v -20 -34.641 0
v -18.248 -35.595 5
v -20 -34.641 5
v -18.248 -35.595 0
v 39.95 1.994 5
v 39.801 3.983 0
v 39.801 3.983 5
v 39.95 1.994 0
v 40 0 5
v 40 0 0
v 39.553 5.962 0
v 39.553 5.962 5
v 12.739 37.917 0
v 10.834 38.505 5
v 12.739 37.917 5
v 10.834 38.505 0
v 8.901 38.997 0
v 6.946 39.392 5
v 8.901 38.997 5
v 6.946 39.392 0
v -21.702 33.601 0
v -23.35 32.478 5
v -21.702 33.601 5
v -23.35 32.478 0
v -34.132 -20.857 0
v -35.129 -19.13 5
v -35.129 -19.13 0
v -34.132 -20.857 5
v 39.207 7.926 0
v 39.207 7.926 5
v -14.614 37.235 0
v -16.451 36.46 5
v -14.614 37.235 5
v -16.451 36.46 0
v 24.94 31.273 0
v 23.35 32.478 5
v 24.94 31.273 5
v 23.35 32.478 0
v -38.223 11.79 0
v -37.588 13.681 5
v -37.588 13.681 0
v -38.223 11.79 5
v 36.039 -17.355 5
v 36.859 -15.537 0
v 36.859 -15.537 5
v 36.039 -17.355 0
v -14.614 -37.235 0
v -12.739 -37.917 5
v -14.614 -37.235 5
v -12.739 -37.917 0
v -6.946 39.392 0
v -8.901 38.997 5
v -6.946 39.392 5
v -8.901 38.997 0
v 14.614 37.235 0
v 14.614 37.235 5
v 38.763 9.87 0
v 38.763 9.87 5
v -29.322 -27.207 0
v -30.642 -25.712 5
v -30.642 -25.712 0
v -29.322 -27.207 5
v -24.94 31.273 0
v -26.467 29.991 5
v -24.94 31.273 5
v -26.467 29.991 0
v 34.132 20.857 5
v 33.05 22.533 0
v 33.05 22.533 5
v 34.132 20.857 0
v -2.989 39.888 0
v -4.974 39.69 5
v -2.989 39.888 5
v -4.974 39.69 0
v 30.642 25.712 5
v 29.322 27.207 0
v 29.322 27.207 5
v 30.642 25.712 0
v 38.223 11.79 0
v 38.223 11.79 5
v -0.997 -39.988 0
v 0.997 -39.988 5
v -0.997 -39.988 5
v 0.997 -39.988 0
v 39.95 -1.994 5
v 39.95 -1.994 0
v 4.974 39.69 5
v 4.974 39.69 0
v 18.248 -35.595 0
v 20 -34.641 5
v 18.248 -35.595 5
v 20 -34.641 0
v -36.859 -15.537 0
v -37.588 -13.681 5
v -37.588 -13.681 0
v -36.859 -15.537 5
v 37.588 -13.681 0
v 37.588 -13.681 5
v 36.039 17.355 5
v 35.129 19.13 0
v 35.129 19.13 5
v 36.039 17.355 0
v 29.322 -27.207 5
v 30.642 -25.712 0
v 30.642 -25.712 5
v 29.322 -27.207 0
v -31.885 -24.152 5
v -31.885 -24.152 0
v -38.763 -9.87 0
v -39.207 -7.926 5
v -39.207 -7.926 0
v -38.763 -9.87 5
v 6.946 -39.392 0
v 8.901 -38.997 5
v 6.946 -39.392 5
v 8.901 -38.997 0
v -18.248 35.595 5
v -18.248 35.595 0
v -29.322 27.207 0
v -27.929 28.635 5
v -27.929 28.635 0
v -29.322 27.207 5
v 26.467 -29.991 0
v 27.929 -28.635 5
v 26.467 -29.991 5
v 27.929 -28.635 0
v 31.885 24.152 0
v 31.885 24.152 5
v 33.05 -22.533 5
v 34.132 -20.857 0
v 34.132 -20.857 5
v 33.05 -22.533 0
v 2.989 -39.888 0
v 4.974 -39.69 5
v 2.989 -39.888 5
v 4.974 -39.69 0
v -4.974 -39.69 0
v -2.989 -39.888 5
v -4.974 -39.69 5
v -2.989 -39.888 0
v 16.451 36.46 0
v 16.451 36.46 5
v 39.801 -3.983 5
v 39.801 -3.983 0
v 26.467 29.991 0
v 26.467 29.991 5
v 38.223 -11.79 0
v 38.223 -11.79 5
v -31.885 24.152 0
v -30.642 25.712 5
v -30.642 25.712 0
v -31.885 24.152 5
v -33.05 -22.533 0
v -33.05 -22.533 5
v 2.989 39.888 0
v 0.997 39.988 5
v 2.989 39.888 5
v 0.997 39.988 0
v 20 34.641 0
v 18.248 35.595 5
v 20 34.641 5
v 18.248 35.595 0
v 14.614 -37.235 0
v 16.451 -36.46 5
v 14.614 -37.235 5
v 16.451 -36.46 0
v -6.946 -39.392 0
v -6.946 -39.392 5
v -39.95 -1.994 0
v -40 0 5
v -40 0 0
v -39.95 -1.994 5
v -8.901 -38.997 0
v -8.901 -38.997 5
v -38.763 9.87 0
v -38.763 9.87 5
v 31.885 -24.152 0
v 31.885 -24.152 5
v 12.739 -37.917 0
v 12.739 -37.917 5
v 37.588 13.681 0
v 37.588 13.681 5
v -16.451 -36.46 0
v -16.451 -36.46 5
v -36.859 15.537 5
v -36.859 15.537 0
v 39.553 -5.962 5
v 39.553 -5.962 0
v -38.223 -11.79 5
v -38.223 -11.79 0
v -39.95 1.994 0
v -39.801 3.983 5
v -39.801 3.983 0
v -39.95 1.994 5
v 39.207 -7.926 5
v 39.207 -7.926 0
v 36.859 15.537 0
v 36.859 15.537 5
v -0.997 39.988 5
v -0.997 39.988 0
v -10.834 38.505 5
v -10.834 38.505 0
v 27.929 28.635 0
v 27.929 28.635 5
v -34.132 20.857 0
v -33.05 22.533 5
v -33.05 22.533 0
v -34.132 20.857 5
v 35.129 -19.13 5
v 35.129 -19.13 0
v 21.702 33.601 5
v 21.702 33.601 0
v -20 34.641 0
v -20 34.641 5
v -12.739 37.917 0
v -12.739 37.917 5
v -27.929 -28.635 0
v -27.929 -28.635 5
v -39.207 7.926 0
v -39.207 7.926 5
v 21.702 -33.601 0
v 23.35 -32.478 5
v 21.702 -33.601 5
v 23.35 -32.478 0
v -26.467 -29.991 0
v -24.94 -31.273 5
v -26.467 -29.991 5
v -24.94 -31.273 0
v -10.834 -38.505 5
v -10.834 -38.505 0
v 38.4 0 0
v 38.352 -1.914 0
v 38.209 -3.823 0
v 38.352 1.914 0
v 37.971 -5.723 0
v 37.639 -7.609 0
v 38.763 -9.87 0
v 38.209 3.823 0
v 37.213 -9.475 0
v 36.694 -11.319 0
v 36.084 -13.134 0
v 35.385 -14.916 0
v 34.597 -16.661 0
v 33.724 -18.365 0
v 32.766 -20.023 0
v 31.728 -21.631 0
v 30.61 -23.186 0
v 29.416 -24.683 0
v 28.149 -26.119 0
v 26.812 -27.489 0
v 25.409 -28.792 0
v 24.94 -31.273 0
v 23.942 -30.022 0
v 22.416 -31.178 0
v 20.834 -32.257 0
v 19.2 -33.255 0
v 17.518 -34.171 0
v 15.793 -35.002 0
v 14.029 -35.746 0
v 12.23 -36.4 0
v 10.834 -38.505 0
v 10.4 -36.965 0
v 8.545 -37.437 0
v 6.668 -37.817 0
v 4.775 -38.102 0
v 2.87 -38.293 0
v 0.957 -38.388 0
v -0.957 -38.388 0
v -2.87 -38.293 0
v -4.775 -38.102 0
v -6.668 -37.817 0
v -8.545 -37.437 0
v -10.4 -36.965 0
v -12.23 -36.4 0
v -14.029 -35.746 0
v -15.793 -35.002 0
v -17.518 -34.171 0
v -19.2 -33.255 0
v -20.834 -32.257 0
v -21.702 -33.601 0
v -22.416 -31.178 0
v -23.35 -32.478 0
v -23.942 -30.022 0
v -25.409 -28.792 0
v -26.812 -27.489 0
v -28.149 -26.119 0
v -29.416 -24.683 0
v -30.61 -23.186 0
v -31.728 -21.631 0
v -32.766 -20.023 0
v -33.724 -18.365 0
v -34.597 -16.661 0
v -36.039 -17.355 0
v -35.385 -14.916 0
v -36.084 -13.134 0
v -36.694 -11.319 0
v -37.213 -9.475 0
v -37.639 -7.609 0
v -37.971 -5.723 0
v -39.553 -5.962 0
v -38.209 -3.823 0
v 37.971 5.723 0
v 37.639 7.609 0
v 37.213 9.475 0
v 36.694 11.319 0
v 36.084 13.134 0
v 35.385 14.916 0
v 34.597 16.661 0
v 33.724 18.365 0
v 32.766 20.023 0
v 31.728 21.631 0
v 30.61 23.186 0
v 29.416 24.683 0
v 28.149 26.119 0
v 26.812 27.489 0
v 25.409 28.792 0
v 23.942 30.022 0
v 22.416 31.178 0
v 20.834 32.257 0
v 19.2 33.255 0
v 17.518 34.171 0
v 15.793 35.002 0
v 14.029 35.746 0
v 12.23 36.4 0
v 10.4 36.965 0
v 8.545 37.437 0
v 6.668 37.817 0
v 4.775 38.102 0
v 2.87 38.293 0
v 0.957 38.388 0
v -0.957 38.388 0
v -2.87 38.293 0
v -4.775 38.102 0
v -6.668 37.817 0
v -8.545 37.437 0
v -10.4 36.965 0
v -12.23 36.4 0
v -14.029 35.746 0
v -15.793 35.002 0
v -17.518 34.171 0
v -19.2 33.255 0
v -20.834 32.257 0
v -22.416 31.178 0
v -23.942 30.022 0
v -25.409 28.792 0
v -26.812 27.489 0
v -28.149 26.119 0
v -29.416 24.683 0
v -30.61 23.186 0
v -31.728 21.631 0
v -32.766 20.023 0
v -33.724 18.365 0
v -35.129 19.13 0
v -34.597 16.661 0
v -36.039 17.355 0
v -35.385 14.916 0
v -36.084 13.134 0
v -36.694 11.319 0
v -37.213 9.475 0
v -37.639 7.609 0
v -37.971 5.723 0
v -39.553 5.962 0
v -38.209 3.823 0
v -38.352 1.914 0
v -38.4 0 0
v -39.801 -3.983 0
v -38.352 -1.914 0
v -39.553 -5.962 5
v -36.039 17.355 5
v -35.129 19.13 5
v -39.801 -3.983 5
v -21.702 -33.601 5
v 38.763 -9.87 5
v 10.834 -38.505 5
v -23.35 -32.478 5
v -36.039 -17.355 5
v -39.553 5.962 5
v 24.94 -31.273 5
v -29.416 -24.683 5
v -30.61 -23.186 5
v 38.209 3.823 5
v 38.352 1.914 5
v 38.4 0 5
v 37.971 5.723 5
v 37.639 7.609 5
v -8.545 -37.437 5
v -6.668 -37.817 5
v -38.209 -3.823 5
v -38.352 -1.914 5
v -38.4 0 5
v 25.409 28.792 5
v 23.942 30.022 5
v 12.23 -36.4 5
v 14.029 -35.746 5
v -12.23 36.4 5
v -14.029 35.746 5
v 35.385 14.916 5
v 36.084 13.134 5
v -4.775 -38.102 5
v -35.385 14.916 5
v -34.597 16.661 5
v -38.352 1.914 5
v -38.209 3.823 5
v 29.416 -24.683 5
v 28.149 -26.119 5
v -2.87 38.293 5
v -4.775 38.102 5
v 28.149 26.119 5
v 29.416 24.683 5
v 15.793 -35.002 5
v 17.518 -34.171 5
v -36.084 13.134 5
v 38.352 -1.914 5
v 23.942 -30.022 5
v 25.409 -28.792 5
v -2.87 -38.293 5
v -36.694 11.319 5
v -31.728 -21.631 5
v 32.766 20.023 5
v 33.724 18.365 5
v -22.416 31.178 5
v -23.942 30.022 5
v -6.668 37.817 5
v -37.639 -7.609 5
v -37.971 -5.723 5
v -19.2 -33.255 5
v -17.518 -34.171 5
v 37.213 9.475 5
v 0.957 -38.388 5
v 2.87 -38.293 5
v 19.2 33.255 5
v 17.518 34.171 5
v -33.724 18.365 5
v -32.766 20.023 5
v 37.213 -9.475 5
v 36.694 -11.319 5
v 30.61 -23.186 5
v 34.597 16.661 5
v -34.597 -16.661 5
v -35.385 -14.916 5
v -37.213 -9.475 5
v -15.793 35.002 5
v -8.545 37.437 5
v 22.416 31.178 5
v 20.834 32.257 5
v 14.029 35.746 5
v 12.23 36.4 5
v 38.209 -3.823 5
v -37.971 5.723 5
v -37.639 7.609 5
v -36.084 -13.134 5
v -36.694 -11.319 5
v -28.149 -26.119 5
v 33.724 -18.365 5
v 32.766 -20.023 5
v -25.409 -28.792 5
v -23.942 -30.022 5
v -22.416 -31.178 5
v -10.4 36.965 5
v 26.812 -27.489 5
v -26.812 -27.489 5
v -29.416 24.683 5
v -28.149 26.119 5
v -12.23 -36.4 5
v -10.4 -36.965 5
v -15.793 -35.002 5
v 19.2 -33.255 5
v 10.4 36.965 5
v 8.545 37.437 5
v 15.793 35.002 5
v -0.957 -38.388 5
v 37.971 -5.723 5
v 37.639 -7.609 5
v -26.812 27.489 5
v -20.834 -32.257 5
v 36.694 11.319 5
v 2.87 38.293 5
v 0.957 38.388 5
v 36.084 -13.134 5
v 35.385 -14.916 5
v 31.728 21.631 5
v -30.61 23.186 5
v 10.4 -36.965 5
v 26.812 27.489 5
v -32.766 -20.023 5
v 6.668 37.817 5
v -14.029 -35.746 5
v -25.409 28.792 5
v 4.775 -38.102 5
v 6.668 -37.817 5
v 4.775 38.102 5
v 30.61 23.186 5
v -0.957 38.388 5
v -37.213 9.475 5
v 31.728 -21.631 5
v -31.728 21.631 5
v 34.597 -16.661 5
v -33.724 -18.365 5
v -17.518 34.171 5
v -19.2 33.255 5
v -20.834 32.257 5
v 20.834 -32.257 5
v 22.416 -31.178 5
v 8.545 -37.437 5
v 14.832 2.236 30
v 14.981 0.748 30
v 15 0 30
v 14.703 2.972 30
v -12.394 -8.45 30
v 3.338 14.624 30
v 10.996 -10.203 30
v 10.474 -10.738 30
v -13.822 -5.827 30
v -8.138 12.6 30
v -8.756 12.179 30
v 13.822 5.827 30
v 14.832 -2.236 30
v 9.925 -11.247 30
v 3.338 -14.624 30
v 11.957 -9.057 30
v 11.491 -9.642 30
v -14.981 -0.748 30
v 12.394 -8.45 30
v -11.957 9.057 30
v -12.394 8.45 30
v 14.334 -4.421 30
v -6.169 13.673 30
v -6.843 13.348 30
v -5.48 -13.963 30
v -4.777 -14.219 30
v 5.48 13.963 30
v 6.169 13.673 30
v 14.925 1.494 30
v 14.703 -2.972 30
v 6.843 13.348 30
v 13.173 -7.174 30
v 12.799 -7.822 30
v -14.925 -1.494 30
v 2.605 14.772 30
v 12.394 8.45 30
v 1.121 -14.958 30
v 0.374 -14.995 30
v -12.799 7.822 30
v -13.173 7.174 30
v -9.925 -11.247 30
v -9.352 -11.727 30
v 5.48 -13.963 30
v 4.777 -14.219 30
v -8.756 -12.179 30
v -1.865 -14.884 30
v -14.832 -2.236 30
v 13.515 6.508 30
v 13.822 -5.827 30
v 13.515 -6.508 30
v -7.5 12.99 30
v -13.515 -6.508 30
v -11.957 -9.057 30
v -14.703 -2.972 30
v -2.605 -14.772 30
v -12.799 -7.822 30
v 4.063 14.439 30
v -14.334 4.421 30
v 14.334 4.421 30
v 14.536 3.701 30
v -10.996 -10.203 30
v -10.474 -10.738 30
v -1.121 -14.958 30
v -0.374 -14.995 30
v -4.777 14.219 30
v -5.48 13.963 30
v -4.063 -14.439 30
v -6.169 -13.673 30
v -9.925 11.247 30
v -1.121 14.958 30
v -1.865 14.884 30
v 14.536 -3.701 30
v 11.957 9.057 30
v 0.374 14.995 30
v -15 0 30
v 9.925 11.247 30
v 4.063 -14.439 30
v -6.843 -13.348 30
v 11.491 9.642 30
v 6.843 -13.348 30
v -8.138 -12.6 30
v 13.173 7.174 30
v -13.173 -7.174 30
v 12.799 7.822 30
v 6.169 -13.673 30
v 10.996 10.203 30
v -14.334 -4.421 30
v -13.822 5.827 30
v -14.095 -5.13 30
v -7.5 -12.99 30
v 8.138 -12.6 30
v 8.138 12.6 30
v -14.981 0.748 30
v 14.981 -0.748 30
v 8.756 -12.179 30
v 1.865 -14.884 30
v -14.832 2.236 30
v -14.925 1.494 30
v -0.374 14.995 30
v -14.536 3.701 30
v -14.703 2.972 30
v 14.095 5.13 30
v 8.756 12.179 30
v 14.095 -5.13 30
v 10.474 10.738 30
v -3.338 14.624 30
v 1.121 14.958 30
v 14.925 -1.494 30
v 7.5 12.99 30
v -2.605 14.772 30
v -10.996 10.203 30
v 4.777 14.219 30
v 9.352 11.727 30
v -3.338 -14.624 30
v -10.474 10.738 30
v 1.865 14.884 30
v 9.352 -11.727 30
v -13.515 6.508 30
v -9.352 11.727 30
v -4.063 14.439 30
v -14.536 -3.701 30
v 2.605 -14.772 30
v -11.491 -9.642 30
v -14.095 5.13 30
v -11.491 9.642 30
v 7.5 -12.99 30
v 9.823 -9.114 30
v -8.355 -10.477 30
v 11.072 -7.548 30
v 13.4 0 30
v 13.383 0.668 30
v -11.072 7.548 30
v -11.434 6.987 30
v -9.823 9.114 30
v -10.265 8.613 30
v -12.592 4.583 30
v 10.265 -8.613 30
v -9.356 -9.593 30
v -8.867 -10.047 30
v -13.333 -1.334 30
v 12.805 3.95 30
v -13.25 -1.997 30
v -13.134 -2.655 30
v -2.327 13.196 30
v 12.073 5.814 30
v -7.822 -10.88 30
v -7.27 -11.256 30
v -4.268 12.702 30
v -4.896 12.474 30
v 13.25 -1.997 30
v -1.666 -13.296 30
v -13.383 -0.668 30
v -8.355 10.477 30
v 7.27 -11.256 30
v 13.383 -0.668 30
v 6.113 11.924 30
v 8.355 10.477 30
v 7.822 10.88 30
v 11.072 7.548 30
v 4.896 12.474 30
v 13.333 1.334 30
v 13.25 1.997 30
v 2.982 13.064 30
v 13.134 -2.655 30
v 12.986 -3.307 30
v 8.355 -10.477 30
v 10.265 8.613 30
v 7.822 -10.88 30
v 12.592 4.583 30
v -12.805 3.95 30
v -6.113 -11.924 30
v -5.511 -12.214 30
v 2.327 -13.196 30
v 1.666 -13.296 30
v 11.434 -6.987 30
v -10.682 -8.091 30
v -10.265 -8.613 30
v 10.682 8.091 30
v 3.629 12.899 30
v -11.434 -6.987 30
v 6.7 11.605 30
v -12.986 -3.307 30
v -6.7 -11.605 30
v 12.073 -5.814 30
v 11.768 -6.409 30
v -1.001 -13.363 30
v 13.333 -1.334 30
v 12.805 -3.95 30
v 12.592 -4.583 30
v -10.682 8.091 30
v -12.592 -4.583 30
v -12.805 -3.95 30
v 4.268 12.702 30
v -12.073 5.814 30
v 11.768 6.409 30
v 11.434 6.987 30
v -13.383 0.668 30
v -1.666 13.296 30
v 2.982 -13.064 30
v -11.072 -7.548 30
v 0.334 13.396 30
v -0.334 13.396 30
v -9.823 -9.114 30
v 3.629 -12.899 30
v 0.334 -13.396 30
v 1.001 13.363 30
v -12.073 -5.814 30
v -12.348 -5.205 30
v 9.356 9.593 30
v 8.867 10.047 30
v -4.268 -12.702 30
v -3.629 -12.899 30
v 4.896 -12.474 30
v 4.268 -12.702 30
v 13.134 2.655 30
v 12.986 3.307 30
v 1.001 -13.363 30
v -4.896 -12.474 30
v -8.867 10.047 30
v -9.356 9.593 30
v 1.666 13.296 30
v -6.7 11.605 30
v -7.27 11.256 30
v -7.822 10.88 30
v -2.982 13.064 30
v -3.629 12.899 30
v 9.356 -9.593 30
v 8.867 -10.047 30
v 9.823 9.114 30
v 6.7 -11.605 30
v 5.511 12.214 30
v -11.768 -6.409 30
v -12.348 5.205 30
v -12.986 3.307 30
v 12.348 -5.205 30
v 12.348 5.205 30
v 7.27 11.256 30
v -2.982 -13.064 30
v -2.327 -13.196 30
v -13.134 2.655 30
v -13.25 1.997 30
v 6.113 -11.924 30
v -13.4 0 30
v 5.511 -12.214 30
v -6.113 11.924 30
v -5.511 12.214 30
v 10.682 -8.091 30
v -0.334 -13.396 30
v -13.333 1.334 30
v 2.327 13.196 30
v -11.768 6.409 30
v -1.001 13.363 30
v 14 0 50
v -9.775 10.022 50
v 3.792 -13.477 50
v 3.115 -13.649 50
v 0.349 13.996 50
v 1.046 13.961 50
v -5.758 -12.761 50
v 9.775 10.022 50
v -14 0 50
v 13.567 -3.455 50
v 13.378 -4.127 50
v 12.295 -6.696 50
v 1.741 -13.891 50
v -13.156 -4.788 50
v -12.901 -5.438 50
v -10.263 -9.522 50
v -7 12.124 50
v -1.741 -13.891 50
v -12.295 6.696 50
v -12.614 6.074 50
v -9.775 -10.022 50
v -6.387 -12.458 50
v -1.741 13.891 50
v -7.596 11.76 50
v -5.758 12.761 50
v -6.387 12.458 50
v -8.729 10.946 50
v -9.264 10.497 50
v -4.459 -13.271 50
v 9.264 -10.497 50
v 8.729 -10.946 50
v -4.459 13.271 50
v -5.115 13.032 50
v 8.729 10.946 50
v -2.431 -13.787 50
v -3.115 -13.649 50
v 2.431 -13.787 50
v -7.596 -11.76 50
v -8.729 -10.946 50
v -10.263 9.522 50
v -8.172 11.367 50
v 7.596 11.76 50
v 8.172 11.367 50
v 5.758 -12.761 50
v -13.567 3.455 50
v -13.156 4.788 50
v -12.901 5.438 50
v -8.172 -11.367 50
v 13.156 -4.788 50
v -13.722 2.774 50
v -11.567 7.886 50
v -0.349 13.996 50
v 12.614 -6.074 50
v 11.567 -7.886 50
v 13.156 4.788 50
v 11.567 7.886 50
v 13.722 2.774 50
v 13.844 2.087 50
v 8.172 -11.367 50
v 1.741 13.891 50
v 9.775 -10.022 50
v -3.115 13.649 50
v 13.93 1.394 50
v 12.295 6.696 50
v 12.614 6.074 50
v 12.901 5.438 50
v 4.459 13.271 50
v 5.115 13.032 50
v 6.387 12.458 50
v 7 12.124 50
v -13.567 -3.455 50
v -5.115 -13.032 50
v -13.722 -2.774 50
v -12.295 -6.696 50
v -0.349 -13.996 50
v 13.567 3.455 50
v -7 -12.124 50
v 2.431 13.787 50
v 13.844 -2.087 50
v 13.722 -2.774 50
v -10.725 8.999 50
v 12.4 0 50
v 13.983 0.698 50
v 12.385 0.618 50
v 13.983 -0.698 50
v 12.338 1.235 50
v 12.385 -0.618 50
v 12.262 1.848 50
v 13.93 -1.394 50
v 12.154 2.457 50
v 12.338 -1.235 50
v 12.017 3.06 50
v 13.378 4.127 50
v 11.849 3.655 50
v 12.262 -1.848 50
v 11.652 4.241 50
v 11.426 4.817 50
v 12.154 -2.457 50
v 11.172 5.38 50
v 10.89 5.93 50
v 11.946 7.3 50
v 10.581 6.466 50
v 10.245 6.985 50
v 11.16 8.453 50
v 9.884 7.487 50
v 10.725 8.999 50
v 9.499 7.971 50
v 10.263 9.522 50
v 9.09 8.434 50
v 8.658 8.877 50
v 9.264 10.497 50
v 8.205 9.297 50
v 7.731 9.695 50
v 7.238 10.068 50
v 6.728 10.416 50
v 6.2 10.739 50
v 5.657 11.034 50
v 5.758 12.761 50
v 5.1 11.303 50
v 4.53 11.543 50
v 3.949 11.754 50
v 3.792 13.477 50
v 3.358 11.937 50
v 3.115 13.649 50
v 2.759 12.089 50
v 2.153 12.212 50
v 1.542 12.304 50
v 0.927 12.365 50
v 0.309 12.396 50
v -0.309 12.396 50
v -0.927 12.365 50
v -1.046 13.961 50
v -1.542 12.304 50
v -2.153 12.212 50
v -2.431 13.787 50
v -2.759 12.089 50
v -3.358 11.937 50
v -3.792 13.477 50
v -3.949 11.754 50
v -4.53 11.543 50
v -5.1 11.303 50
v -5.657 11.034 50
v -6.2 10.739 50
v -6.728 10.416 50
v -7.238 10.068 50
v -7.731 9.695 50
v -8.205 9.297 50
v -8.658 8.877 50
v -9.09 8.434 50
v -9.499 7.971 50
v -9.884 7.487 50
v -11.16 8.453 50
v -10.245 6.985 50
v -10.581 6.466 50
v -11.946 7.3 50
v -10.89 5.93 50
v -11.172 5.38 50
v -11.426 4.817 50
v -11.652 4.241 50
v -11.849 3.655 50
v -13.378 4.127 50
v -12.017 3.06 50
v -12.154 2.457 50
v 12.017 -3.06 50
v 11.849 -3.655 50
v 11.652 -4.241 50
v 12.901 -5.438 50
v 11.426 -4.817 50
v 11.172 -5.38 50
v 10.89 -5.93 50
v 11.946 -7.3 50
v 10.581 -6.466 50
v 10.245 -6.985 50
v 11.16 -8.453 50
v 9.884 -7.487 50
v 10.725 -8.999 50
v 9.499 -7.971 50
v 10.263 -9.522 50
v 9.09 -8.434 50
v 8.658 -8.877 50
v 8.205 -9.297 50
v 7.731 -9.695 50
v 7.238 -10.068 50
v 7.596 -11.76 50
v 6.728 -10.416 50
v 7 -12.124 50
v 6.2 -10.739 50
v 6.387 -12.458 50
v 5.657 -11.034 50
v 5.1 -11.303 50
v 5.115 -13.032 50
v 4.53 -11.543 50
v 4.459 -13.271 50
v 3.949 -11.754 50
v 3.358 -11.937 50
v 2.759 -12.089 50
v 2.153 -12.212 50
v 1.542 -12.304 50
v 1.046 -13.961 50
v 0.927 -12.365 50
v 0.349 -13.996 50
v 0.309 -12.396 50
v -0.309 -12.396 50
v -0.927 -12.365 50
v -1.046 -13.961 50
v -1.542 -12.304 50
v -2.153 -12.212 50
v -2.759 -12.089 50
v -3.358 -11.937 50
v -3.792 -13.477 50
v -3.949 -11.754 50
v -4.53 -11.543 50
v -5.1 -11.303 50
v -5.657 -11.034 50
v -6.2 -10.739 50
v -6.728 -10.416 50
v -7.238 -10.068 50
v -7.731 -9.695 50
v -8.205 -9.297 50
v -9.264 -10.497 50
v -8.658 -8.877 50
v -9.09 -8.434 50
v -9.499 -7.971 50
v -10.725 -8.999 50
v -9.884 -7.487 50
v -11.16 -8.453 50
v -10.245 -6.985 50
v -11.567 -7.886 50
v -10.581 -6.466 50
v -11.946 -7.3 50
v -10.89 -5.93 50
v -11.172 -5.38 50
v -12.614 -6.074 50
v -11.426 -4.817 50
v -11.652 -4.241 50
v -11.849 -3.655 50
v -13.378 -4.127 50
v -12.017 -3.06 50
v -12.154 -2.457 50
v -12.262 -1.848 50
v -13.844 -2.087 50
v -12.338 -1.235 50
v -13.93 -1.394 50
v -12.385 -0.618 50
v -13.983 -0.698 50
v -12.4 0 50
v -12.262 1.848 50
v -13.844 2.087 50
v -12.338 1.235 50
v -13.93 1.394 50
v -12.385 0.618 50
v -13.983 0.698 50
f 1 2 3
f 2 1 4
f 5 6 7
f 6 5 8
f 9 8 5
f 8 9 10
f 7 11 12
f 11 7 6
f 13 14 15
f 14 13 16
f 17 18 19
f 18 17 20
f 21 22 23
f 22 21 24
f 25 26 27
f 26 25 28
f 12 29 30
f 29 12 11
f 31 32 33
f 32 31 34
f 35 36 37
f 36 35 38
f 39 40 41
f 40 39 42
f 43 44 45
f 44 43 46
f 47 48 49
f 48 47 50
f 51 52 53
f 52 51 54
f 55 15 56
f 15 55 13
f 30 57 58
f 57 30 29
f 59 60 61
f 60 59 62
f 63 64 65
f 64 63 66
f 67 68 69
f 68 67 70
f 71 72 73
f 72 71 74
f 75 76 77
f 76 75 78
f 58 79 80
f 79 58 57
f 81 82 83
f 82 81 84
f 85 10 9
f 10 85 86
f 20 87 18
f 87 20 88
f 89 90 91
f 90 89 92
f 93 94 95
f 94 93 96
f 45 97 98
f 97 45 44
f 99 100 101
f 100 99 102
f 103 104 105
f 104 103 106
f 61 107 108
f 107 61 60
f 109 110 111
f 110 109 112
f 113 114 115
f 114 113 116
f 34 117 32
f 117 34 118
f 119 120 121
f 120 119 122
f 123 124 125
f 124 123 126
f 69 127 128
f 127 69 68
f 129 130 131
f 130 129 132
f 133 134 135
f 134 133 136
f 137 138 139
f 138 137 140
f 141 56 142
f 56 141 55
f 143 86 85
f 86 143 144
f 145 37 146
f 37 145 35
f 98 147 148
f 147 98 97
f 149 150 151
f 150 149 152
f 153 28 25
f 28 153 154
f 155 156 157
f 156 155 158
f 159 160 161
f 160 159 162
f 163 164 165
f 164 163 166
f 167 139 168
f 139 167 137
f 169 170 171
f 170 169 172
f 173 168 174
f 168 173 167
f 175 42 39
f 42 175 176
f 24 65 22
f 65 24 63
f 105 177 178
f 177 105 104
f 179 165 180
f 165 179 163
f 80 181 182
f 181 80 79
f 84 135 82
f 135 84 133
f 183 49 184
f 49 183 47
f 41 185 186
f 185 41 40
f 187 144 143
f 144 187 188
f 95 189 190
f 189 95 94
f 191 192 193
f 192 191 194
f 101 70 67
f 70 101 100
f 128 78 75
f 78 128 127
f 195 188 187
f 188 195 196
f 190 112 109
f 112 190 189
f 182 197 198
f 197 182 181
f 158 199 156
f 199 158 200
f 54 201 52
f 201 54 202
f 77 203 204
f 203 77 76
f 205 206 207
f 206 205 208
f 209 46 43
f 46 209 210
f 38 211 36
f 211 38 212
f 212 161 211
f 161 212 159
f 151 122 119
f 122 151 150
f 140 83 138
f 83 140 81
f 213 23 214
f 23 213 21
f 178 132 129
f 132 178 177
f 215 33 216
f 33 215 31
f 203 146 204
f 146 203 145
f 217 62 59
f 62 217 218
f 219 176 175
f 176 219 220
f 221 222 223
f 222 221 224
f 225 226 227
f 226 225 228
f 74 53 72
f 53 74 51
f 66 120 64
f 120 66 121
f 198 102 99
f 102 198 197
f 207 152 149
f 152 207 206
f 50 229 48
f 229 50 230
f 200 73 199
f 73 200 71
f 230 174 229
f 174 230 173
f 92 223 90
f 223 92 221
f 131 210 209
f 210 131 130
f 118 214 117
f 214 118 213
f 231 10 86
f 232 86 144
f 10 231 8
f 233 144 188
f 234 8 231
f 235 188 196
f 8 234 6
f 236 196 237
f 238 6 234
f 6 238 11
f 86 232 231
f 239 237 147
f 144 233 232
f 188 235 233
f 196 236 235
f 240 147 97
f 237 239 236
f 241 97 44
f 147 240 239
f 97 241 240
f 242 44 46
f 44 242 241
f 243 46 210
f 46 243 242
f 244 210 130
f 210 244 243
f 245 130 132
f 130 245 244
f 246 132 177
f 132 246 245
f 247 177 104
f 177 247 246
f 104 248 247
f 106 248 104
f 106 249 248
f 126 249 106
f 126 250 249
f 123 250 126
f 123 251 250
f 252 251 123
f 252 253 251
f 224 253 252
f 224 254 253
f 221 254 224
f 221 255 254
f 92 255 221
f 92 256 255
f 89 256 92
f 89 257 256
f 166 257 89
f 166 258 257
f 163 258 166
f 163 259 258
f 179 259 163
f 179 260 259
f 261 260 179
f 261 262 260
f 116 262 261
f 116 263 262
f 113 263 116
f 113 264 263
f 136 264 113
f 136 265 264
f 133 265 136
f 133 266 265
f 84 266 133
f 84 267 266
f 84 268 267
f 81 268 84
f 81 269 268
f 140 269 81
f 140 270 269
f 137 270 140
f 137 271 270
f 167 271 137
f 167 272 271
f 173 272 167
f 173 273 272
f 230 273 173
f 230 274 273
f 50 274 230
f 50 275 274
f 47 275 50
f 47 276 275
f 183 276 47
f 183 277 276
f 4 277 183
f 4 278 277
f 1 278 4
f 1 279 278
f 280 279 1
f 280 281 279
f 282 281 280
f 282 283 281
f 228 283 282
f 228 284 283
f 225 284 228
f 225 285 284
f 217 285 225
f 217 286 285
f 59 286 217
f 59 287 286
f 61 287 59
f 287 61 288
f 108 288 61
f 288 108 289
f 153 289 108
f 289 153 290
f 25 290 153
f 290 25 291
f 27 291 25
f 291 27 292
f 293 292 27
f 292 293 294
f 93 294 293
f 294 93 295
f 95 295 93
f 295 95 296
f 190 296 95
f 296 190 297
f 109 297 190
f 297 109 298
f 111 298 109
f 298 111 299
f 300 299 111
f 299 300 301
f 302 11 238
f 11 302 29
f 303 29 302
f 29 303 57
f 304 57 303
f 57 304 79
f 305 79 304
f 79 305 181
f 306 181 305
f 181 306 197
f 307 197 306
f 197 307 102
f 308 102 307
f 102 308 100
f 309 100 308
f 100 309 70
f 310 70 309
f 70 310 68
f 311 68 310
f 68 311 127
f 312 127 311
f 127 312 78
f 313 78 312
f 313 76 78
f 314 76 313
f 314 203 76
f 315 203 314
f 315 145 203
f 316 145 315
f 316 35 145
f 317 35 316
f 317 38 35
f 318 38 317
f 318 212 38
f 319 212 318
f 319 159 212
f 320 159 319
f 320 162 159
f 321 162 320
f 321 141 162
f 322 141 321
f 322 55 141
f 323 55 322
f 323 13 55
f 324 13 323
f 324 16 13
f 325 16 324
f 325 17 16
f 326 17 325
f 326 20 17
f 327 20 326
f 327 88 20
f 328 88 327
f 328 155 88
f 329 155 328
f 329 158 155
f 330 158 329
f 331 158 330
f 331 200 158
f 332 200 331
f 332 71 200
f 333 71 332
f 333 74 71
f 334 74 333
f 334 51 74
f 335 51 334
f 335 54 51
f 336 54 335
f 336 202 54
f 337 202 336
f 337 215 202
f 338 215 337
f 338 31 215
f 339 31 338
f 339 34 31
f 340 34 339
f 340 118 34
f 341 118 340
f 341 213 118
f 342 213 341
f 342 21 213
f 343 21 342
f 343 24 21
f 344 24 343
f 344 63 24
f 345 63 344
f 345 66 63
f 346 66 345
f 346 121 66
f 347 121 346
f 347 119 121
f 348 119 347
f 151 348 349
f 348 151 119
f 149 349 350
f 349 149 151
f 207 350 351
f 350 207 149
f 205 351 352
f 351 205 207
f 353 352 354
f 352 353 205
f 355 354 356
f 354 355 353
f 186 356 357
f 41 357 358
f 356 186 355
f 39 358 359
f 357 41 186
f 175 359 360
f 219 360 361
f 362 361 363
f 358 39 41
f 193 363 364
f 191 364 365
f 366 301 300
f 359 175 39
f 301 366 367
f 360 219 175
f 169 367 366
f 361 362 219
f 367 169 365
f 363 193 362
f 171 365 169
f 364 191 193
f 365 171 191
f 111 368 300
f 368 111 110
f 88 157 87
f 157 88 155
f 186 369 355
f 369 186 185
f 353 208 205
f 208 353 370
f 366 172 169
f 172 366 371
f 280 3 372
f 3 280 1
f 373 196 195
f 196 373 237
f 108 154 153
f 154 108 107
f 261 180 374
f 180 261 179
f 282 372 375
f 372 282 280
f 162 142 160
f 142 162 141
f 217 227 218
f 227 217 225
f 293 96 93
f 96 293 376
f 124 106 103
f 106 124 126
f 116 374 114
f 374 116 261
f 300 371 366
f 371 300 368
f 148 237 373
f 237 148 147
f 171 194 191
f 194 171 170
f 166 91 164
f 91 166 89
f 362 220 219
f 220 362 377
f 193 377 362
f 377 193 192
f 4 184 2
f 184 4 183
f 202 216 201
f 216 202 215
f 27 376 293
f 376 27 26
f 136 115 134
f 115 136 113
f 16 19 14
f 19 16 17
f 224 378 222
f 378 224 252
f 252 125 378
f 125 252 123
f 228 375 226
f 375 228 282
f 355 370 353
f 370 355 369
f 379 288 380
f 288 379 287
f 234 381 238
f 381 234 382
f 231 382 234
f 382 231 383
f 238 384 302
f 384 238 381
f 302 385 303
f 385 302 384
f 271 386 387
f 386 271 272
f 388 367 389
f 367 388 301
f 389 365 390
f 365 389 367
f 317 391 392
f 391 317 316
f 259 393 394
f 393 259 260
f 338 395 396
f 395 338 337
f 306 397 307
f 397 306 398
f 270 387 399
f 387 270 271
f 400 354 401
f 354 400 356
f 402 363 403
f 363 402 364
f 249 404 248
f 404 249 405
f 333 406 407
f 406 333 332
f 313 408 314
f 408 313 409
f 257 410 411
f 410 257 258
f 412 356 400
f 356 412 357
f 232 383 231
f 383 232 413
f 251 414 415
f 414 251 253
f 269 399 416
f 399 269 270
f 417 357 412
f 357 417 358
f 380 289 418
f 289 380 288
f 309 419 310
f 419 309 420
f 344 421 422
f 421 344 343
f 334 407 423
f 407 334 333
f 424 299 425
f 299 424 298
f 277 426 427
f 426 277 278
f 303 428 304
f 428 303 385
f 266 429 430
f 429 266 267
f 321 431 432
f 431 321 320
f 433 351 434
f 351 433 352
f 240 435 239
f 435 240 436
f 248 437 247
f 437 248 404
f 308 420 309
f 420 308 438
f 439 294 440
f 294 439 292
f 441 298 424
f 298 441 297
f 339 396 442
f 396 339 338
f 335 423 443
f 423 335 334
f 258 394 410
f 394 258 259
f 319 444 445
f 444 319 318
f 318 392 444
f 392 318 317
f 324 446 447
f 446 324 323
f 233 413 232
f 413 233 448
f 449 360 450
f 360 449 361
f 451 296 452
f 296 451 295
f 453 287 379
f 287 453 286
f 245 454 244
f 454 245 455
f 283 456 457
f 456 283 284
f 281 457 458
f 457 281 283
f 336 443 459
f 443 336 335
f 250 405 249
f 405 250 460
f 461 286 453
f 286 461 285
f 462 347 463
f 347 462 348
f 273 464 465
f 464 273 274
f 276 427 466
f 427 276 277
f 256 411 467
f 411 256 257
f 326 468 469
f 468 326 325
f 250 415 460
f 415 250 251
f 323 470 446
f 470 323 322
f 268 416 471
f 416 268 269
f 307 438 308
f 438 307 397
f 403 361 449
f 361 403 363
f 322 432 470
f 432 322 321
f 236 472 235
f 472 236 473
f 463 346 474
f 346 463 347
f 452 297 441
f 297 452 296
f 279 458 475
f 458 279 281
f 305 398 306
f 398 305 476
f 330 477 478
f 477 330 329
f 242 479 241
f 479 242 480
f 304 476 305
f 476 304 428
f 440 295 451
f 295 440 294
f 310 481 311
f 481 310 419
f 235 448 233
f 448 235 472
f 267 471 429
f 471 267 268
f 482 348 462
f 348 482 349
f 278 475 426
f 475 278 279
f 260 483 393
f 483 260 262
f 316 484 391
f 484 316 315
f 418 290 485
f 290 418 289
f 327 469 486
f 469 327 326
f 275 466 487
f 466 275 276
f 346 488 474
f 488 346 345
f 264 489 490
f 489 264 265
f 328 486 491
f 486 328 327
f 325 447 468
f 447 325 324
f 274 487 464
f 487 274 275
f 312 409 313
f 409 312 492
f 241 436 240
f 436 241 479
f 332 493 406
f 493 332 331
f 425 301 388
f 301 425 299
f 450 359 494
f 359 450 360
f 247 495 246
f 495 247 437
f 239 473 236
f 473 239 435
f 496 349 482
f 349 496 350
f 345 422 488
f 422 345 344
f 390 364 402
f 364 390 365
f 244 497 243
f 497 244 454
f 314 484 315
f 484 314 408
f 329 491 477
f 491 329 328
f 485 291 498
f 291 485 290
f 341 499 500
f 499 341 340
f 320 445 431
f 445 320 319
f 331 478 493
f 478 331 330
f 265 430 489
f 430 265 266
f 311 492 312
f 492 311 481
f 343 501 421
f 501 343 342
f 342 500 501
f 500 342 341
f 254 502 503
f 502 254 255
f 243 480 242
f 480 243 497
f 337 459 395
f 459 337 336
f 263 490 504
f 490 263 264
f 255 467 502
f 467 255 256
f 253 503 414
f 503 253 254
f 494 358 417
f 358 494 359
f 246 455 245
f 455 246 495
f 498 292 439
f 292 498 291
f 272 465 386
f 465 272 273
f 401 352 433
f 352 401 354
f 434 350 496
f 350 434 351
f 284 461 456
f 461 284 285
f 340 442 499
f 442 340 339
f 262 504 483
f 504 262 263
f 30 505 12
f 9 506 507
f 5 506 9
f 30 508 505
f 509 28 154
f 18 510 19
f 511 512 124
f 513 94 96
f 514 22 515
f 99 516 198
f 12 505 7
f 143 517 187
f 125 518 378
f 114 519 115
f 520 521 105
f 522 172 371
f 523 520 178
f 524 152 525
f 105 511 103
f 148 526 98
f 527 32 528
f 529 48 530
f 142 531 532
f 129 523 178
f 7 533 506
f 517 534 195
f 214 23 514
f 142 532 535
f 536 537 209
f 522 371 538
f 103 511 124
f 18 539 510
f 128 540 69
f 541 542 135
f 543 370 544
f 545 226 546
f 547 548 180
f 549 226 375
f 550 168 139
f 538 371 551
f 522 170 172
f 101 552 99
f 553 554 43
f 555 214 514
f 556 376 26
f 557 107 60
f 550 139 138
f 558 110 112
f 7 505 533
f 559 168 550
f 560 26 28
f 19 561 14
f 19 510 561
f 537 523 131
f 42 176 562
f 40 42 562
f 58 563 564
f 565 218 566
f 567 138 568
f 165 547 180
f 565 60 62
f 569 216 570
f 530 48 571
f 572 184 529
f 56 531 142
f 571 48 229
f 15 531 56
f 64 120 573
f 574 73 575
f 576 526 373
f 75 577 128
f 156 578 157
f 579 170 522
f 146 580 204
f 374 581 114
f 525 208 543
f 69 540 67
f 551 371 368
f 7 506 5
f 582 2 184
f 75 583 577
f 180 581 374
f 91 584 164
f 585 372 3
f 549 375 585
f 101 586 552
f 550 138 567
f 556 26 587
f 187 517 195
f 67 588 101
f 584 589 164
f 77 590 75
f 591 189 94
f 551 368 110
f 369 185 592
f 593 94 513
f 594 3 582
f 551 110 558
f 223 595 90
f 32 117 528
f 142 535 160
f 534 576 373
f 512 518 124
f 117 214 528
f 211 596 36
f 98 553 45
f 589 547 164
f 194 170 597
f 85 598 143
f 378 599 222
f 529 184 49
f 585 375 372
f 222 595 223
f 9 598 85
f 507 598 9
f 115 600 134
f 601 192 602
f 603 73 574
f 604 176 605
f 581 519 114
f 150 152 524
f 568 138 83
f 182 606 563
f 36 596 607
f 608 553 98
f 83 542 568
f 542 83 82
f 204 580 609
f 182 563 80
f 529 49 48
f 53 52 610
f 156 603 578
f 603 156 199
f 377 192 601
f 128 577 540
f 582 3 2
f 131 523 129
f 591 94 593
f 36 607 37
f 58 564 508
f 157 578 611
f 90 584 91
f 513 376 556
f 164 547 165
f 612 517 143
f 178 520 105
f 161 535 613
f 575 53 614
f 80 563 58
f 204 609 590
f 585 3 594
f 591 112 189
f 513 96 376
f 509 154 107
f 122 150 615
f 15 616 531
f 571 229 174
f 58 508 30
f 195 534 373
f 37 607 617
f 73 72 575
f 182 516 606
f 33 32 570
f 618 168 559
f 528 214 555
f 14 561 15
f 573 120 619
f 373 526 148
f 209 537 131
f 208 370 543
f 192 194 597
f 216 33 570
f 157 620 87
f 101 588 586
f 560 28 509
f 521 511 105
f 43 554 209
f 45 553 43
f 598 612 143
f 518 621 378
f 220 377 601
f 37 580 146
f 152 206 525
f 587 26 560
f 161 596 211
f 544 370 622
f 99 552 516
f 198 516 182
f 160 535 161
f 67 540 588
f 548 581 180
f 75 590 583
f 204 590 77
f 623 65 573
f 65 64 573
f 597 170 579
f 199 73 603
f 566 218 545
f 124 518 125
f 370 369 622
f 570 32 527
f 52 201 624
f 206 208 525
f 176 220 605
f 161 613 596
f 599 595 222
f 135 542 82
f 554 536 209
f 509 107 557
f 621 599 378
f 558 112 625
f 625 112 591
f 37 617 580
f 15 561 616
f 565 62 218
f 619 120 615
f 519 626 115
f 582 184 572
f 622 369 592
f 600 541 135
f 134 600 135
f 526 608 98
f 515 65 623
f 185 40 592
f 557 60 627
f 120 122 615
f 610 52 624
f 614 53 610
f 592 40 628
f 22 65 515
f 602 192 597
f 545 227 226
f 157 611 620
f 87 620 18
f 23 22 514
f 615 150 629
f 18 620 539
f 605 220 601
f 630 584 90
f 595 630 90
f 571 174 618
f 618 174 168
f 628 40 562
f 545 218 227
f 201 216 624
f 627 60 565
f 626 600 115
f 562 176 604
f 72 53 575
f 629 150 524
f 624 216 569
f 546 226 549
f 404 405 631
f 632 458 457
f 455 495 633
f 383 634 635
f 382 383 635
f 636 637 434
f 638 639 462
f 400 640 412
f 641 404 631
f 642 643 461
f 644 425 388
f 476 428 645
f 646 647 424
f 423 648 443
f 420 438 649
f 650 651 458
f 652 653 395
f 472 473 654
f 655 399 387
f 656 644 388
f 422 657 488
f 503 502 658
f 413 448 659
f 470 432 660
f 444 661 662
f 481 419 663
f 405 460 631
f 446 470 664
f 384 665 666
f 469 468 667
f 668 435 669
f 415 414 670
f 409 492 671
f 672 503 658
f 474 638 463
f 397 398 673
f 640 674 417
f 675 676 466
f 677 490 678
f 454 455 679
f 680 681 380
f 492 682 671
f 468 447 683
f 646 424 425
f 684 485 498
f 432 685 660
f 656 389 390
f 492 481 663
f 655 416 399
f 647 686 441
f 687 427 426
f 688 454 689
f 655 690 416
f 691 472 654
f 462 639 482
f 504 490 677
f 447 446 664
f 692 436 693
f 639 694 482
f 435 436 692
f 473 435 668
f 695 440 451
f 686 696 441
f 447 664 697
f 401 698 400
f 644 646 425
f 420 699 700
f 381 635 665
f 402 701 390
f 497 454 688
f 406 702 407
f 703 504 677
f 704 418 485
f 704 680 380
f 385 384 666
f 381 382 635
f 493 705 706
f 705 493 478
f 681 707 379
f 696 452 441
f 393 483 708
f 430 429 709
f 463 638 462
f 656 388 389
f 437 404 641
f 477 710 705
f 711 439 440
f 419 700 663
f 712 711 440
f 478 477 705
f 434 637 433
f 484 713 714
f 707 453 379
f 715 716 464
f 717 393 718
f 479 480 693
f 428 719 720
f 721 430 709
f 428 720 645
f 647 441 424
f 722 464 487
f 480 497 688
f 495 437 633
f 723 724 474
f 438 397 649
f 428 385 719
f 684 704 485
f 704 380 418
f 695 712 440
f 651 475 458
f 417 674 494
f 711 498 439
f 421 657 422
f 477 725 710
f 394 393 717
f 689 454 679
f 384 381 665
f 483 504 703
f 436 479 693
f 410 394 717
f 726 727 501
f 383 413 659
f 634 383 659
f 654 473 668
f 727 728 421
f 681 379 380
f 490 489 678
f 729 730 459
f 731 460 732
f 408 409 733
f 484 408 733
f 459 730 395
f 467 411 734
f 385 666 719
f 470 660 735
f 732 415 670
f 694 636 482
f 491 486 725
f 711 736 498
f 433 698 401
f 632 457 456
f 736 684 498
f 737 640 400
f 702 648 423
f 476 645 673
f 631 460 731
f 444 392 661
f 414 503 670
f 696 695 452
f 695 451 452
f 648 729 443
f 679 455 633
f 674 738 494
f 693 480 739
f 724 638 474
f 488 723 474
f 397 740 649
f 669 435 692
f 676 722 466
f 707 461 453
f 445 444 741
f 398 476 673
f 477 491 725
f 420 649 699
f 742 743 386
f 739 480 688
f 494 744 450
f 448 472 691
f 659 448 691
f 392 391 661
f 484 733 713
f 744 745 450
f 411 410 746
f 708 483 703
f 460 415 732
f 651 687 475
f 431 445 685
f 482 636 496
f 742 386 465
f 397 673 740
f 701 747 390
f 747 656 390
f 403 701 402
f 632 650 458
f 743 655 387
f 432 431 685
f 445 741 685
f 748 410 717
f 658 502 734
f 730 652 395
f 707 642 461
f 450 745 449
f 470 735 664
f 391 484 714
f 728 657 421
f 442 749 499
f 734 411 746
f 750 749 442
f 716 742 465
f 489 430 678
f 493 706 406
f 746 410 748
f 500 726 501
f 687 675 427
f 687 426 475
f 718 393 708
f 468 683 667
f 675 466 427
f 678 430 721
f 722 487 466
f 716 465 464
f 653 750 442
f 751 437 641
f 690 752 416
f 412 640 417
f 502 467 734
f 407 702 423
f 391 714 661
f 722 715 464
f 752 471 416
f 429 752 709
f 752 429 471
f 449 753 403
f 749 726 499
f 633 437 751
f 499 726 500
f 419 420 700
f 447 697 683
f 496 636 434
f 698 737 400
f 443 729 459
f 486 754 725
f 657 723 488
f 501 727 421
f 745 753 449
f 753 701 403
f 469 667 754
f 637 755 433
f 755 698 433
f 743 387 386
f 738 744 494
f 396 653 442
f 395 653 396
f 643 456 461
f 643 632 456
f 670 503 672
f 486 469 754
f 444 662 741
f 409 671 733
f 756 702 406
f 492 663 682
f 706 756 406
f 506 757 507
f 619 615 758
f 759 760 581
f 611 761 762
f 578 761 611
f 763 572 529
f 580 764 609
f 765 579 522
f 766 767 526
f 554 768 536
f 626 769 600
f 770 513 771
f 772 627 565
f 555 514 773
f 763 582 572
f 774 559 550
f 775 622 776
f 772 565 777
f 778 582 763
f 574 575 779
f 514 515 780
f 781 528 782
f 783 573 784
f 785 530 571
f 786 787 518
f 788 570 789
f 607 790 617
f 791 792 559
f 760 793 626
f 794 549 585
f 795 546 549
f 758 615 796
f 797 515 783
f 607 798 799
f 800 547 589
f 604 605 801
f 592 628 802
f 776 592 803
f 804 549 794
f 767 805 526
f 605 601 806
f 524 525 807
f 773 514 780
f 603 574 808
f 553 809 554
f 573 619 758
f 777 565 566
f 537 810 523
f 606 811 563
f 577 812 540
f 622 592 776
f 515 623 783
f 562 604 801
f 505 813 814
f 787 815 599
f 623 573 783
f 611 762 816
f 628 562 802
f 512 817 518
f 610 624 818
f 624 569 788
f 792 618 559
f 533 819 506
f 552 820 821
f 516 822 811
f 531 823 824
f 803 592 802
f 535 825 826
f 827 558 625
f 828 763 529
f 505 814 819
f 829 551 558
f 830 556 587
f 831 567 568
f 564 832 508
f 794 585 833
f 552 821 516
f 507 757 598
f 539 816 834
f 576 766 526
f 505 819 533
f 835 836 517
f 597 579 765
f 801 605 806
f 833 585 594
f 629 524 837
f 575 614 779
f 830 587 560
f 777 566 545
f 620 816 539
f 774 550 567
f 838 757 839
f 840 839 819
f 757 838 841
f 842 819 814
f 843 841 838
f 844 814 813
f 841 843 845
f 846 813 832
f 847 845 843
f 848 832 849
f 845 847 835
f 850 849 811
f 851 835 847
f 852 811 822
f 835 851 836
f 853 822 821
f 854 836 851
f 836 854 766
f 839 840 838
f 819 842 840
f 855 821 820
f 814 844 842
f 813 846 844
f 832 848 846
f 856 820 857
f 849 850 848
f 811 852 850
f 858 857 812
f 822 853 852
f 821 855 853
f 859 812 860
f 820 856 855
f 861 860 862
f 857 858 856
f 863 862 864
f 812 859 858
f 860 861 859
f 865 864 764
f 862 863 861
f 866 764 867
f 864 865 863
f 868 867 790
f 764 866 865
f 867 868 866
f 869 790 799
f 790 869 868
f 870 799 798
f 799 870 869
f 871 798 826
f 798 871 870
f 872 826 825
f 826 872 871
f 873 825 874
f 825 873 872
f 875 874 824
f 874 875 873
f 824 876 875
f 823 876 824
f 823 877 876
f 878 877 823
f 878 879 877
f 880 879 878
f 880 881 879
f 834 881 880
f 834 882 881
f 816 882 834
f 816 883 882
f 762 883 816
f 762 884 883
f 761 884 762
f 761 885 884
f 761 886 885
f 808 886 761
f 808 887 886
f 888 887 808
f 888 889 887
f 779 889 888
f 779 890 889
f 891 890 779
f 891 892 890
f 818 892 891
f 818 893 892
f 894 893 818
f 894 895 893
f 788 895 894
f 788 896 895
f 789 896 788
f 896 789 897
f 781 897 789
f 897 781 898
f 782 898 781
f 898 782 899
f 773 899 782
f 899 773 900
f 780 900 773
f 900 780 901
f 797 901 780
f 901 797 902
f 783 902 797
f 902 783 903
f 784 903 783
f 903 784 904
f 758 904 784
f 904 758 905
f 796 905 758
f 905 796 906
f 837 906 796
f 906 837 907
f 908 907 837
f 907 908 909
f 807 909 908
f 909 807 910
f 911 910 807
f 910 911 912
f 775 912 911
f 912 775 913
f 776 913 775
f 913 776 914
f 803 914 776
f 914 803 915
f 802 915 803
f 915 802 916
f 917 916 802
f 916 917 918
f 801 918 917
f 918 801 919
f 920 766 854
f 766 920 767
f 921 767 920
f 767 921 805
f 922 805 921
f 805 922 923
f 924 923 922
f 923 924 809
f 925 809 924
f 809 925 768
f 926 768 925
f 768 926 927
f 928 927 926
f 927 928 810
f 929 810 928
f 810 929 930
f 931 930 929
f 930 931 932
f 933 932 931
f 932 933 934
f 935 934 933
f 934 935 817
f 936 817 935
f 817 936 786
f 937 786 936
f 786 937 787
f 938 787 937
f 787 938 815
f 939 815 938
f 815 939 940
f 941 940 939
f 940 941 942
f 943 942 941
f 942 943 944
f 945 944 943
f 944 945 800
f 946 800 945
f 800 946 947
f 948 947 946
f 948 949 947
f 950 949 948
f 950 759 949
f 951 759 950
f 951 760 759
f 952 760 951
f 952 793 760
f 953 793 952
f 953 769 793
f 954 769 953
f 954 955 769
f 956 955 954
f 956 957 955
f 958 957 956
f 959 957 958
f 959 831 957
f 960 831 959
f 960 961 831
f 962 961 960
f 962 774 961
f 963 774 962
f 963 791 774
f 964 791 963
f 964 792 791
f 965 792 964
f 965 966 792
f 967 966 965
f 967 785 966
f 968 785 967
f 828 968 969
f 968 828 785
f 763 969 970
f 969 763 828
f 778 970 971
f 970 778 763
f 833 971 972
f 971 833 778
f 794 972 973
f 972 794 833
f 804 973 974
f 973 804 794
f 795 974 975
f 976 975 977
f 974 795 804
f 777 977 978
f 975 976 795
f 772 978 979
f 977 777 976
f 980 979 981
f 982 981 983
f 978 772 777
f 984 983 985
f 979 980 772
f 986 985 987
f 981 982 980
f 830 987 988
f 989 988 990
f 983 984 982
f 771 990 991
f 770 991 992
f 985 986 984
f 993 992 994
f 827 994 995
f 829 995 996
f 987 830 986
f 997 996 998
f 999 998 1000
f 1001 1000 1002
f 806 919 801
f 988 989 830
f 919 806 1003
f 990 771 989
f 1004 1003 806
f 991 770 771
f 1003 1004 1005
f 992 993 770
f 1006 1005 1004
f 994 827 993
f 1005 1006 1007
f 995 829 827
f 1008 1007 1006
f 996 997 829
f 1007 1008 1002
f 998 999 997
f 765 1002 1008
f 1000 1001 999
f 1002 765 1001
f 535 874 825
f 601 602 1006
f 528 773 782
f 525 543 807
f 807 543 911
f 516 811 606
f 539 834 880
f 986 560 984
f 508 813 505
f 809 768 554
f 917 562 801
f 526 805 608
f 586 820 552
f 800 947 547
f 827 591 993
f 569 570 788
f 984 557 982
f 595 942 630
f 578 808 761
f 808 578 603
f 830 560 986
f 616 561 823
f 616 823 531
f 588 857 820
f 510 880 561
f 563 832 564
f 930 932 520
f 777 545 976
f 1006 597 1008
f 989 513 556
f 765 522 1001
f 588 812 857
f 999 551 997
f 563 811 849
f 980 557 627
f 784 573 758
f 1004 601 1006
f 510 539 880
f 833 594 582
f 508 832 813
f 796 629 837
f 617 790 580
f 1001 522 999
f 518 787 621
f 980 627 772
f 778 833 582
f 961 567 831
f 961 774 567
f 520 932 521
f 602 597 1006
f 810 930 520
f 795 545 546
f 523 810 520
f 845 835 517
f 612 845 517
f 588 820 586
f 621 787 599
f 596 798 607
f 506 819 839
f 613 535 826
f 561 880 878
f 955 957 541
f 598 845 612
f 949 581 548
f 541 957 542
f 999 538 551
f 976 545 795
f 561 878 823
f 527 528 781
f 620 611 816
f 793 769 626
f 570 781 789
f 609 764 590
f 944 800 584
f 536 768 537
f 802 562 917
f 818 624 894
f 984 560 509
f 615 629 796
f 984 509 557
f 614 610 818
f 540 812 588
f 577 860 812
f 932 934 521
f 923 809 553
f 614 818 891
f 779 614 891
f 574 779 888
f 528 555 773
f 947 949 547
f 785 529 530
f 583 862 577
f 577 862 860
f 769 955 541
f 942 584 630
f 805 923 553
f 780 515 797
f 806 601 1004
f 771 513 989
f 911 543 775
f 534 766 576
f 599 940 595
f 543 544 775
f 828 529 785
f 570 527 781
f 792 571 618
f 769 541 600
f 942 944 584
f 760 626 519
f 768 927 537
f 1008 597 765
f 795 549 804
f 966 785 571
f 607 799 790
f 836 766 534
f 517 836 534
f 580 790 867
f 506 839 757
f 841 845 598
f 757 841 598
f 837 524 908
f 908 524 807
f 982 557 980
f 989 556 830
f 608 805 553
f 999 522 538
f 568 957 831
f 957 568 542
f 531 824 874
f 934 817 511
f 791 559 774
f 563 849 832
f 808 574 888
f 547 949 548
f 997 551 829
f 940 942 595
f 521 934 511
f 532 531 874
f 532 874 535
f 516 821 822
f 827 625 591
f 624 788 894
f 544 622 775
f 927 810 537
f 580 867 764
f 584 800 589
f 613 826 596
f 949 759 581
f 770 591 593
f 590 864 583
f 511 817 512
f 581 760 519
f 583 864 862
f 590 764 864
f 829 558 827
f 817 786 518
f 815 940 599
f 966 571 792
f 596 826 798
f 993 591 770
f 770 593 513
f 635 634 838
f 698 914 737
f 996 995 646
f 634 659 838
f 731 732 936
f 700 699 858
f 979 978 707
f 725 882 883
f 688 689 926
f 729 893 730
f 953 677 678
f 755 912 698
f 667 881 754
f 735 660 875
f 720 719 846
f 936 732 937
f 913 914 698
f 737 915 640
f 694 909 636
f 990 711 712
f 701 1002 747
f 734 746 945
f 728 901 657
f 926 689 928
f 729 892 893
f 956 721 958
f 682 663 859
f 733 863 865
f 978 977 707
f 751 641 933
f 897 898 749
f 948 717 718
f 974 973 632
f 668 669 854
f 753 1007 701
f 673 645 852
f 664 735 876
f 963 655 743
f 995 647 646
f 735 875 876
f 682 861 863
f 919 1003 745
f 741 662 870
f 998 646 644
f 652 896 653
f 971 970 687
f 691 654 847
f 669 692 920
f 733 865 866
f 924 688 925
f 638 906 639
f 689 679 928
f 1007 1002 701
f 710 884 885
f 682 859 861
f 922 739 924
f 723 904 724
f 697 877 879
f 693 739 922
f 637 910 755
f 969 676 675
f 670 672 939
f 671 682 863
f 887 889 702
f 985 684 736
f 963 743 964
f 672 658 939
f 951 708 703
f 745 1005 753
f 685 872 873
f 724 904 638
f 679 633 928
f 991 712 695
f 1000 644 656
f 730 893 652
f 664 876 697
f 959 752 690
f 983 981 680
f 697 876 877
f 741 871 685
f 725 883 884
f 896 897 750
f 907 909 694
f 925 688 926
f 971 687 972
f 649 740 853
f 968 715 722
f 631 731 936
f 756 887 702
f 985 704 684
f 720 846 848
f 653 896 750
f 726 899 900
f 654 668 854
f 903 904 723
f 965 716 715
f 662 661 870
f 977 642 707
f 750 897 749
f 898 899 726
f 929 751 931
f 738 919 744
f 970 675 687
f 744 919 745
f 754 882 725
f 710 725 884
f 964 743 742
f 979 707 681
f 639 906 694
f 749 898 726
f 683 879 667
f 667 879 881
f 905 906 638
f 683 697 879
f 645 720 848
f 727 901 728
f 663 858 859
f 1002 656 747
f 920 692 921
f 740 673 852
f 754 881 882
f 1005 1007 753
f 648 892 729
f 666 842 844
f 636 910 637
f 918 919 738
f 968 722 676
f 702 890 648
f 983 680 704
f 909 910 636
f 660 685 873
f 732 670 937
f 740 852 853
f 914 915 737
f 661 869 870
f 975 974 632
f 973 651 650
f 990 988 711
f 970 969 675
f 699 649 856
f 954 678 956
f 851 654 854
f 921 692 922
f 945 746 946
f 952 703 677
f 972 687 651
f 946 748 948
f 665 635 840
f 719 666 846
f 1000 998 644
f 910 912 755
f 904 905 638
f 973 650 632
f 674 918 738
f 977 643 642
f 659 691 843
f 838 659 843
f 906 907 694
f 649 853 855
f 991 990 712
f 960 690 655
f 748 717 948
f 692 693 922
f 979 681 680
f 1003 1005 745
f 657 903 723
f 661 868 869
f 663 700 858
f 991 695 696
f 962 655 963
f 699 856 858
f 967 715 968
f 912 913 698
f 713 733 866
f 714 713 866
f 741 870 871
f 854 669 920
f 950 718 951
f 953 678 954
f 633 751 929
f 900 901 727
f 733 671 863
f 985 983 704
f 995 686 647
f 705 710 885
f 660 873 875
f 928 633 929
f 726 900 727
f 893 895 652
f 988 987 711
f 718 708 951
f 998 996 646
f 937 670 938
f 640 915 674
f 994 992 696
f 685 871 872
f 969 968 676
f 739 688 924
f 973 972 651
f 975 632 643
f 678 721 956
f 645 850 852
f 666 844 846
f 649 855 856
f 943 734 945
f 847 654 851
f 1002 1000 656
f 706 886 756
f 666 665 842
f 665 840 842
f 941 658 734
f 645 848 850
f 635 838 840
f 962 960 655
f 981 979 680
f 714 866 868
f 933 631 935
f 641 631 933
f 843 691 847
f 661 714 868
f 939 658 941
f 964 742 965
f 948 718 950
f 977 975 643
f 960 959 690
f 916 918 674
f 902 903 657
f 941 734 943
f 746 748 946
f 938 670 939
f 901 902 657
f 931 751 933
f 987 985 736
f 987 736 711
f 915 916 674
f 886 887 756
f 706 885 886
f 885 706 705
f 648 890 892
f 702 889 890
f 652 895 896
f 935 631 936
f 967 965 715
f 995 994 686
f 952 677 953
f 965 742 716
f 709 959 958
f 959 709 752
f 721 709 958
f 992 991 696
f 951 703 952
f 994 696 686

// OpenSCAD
//Simple funnel
//embudo sencillo
//define 3 radius dimensions
//define 3 heigths 
//define thickness

R1=40;
R2=15;
R3=14;

H0=5;
H1desired=25;
H1=max(H1desired,R1-R2);//to prevent overhangs <45º, H1>R1-R2
H2=20;



thick=0.8;//you might want to take into account your nozzle size

Sides=3.15*R1;//feel free to replace the formula by any number



difference() {

cylinder (h=H0, r=R1, $fn=Sides);
cylinder (h=H0, r=R1-2*thick,  $fn=Sides);
} // end difference


translate ( [0,0,H0])
difference() {

cylinder (h=H1, r1=R1, r2=R2,  $fn=Sides);
cylinder (h=H1, r1=R1-2*thick, r2=R2-2*thick,  $fn=Sides);
} // end difference

translate ( [0,0,H0+H1])
difference() {

cylinder (h=H2, r1=R2, r2=R3,  $fn=Sides);
cylinder (h=H2, r1=R2-2*thick, r2=R3-2*thick,  $fn=Sides);
} // end difference
